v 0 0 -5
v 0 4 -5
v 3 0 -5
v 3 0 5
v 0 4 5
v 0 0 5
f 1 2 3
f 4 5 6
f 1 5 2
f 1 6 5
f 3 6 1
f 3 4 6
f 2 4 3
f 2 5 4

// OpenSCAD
 triangle_points =[[0,0],[3,0],[0,4]];
 triangle_paths =[[0,1,2]];
 
////rotate([60,0,0])
linear_extrude(height = 10, center = true, convexity = 10, scale=[1,1], $fn=100)
polygon(triangle_points,triangle_paths,10);
